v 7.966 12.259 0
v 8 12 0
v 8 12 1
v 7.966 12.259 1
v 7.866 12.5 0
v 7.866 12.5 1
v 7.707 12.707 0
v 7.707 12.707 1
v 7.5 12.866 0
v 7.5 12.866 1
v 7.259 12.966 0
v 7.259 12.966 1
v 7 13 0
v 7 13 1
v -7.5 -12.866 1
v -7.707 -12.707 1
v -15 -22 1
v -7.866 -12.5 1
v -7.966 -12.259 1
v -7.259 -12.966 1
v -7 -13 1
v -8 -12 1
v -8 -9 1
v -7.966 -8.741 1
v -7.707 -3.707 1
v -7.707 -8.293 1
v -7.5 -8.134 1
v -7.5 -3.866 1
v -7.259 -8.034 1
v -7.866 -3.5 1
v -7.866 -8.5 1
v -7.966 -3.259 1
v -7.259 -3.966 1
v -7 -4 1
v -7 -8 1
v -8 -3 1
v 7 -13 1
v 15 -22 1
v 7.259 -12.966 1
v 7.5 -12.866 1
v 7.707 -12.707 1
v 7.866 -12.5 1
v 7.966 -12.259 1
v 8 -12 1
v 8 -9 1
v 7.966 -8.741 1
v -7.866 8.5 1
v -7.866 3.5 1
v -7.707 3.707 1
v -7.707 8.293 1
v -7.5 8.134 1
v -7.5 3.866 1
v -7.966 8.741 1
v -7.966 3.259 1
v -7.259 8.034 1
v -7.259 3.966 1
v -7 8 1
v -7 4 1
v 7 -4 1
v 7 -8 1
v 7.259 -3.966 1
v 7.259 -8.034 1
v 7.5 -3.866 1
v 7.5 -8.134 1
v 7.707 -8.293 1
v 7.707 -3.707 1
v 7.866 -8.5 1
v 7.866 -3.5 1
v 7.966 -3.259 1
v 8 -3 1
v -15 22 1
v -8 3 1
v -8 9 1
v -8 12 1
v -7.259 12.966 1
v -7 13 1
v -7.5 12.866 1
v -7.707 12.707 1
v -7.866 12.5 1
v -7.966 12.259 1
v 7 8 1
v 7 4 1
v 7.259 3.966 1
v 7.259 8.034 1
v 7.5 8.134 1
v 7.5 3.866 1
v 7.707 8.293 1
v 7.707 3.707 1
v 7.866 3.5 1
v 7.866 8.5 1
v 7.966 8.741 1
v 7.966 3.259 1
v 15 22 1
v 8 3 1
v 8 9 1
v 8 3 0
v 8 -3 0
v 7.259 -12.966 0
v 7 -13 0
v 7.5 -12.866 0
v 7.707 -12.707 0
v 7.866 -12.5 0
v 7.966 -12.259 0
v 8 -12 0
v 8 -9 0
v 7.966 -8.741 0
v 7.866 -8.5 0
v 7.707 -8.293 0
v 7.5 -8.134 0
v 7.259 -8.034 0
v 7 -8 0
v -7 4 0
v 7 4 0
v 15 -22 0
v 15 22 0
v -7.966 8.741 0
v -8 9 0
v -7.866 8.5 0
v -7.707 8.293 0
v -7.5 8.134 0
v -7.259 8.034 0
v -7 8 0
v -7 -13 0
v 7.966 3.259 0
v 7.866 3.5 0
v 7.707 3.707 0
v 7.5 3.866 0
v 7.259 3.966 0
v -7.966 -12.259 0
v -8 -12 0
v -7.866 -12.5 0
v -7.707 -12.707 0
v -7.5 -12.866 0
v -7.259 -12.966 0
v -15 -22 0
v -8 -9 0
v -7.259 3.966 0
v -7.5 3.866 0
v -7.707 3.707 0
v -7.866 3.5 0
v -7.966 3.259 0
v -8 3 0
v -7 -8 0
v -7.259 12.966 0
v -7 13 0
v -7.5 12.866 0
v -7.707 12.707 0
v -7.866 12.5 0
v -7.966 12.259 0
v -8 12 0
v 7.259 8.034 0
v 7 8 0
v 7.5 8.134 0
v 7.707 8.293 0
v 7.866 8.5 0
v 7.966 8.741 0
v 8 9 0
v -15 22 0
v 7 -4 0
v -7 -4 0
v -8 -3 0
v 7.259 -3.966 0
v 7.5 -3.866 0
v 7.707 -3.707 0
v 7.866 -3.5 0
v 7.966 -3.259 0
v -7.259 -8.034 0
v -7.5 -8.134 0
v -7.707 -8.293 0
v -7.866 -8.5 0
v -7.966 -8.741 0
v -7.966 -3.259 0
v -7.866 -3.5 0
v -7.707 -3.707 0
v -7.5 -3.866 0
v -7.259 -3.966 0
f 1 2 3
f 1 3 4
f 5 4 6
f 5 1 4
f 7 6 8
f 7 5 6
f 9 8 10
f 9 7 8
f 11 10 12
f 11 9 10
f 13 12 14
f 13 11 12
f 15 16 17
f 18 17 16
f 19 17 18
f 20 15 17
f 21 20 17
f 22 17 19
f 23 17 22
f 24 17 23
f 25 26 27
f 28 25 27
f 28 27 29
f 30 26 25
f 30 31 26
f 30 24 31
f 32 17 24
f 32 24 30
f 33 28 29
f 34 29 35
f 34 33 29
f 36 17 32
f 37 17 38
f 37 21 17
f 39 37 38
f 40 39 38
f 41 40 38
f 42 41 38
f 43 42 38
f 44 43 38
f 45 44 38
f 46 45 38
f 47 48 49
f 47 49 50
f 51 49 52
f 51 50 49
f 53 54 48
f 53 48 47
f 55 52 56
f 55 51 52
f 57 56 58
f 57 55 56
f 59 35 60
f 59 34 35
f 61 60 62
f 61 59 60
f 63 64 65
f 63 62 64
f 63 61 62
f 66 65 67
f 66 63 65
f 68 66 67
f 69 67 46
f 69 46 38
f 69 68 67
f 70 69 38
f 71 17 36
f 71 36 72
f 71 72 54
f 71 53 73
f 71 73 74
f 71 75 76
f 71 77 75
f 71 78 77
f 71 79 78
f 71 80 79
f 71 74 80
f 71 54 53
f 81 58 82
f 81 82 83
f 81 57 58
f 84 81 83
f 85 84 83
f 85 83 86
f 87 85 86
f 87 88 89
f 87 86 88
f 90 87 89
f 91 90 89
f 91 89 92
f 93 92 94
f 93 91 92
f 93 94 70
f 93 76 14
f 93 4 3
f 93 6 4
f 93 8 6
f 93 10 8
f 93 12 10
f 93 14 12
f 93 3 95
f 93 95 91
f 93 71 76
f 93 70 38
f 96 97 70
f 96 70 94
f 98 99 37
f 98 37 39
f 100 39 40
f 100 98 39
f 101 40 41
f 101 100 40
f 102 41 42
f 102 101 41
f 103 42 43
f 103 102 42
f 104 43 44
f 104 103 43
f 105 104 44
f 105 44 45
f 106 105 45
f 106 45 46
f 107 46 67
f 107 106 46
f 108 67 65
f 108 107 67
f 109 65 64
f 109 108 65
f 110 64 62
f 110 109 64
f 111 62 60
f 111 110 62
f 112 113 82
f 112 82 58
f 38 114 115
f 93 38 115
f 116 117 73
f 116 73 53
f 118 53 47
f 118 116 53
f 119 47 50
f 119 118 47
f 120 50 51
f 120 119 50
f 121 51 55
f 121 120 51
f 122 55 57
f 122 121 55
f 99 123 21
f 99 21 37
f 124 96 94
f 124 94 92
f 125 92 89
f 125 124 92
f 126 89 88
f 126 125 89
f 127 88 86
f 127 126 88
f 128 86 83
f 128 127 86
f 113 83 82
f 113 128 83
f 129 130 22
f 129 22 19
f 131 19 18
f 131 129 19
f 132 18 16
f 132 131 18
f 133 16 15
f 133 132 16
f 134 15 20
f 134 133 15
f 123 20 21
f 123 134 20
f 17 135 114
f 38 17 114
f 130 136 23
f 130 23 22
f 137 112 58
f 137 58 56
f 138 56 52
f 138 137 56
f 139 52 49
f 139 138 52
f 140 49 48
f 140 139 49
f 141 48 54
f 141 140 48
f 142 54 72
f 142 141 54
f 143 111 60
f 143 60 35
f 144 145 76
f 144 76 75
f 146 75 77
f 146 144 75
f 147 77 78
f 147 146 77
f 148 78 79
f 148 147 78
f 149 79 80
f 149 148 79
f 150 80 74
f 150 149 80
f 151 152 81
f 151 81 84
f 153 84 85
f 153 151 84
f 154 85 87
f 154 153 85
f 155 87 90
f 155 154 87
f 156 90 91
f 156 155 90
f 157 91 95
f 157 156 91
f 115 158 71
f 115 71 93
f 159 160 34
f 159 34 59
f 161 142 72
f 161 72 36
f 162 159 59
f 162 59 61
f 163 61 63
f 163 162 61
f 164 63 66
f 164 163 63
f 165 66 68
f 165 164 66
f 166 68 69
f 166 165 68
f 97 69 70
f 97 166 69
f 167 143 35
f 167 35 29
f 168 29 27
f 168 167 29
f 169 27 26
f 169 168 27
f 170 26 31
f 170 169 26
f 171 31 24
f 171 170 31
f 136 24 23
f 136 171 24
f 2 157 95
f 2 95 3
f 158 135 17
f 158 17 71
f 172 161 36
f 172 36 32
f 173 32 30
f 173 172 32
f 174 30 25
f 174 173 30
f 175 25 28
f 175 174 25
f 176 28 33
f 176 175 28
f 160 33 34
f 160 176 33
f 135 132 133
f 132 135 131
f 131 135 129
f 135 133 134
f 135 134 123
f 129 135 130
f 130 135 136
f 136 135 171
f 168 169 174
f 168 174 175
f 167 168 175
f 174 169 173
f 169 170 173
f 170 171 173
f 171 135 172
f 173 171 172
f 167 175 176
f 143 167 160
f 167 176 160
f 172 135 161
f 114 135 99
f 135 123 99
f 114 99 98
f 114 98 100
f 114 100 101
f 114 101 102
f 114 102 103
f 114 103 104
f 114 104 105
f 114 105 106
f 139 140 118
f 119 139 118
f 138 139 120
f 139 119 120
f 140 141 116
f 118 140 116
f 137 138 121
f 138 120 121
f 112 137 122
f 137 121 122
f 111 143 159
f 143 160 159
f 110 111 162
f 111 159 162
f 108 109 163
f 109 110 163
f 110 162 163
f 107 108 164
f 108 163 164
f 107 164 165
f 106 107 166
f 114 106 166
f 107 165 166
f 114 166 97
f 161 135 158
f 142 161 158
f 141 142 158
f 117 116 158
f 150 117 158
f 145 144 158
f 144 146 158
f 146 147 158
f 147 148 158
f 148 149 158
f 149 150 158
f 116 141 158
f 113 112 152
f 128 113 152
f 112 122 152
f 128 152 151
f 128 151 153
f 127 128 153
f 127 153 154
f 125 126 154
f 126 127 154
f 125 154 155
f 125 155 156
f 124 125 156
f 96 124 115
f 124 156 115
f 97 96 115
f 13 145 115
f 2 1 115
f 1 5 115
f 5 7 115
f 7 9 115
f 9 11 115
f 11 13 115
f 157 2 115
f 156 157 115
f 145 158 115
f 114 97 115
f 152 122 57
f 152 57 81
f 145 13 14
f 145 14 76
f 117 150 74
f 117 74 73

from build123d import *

# Parameters (mm, degrees)
SKETCH1_W           = 30
SKETCH1_H           = 44
BOSS_EXTRUDE2_DEPTH = 1


with BuildPart() as part:
    # Sketch1 → Boss-Extrude2 (new body)
    with BuildSketch(Plane.XY):
        Rectangle(SKETCH1_W, SKETCH1_H)
        with BuildLine():
            Line((-7, 8), (7, 8))
            ThreePointArc((7, 8), (7.707106781, 8.292893219), (8, 9))
            Line((8, 9), (8, 12))
            ThreePointArc((8, 12), (7.707106781, 12.707106781), (7, 13))
            Line((7, 13), (-7, 13))
            ThreePointArc((-7, 13), (-7.707106781, 12.707106781), (-8, 12))
            Line((-8, 12), (-8, 9))
            ThreePointArc((-8, 9), (-7.707106781, 8.292893219), (-7, 8))
        make_face(mode=Mode.SUBTRACT)
        with BuildLine():
            Line((-7, -4), (7, -4))
            ThreePointArc((7, -4), (7.707106781, -3.707106781), (8, -3))
            Line((8, -3), (8, 3))
            ThreePointArc((8, 3), (7.707106781, 3.707106781), (7, 4))
            Line((7, 4), (-7, 4))
            ThreePointArc((-7, 4), (-7.707106781, 3.707106781), (-8, 3))
            Line((-8, 3), (-8, -3))
            ThreePointArc((-8, -3), (-7.707106781, -3.707106781), (-7, -4))
        make_face(mode=Mode.SUBTRACT)
        with BuildLine():
            Line((-7, -13), (7, -13))
            ThreePointArc((7, -13), (7.707106781, -12.707106781), (8, -12))
            Line((8, -12), (8, -9))
            ThreePointArc((8, -9), (7.707106781, -8.292893219), (7, -8))
            Line((7, -8), (-7, -8))
            ThreePointArc((-7, -8), (-7.707106781, -8.292893219), (-8, -9))
            Line((-8, -9), (-8, -12))
            ThreePointArc((-8, -12), (-7.707106781, -12.707106781), (-7, -13))
        make_face(mode=Mode.SUBTRACT)
    extrude(amount=BOSS_EXTRUDE2_DEPTH)


solid = part.part
